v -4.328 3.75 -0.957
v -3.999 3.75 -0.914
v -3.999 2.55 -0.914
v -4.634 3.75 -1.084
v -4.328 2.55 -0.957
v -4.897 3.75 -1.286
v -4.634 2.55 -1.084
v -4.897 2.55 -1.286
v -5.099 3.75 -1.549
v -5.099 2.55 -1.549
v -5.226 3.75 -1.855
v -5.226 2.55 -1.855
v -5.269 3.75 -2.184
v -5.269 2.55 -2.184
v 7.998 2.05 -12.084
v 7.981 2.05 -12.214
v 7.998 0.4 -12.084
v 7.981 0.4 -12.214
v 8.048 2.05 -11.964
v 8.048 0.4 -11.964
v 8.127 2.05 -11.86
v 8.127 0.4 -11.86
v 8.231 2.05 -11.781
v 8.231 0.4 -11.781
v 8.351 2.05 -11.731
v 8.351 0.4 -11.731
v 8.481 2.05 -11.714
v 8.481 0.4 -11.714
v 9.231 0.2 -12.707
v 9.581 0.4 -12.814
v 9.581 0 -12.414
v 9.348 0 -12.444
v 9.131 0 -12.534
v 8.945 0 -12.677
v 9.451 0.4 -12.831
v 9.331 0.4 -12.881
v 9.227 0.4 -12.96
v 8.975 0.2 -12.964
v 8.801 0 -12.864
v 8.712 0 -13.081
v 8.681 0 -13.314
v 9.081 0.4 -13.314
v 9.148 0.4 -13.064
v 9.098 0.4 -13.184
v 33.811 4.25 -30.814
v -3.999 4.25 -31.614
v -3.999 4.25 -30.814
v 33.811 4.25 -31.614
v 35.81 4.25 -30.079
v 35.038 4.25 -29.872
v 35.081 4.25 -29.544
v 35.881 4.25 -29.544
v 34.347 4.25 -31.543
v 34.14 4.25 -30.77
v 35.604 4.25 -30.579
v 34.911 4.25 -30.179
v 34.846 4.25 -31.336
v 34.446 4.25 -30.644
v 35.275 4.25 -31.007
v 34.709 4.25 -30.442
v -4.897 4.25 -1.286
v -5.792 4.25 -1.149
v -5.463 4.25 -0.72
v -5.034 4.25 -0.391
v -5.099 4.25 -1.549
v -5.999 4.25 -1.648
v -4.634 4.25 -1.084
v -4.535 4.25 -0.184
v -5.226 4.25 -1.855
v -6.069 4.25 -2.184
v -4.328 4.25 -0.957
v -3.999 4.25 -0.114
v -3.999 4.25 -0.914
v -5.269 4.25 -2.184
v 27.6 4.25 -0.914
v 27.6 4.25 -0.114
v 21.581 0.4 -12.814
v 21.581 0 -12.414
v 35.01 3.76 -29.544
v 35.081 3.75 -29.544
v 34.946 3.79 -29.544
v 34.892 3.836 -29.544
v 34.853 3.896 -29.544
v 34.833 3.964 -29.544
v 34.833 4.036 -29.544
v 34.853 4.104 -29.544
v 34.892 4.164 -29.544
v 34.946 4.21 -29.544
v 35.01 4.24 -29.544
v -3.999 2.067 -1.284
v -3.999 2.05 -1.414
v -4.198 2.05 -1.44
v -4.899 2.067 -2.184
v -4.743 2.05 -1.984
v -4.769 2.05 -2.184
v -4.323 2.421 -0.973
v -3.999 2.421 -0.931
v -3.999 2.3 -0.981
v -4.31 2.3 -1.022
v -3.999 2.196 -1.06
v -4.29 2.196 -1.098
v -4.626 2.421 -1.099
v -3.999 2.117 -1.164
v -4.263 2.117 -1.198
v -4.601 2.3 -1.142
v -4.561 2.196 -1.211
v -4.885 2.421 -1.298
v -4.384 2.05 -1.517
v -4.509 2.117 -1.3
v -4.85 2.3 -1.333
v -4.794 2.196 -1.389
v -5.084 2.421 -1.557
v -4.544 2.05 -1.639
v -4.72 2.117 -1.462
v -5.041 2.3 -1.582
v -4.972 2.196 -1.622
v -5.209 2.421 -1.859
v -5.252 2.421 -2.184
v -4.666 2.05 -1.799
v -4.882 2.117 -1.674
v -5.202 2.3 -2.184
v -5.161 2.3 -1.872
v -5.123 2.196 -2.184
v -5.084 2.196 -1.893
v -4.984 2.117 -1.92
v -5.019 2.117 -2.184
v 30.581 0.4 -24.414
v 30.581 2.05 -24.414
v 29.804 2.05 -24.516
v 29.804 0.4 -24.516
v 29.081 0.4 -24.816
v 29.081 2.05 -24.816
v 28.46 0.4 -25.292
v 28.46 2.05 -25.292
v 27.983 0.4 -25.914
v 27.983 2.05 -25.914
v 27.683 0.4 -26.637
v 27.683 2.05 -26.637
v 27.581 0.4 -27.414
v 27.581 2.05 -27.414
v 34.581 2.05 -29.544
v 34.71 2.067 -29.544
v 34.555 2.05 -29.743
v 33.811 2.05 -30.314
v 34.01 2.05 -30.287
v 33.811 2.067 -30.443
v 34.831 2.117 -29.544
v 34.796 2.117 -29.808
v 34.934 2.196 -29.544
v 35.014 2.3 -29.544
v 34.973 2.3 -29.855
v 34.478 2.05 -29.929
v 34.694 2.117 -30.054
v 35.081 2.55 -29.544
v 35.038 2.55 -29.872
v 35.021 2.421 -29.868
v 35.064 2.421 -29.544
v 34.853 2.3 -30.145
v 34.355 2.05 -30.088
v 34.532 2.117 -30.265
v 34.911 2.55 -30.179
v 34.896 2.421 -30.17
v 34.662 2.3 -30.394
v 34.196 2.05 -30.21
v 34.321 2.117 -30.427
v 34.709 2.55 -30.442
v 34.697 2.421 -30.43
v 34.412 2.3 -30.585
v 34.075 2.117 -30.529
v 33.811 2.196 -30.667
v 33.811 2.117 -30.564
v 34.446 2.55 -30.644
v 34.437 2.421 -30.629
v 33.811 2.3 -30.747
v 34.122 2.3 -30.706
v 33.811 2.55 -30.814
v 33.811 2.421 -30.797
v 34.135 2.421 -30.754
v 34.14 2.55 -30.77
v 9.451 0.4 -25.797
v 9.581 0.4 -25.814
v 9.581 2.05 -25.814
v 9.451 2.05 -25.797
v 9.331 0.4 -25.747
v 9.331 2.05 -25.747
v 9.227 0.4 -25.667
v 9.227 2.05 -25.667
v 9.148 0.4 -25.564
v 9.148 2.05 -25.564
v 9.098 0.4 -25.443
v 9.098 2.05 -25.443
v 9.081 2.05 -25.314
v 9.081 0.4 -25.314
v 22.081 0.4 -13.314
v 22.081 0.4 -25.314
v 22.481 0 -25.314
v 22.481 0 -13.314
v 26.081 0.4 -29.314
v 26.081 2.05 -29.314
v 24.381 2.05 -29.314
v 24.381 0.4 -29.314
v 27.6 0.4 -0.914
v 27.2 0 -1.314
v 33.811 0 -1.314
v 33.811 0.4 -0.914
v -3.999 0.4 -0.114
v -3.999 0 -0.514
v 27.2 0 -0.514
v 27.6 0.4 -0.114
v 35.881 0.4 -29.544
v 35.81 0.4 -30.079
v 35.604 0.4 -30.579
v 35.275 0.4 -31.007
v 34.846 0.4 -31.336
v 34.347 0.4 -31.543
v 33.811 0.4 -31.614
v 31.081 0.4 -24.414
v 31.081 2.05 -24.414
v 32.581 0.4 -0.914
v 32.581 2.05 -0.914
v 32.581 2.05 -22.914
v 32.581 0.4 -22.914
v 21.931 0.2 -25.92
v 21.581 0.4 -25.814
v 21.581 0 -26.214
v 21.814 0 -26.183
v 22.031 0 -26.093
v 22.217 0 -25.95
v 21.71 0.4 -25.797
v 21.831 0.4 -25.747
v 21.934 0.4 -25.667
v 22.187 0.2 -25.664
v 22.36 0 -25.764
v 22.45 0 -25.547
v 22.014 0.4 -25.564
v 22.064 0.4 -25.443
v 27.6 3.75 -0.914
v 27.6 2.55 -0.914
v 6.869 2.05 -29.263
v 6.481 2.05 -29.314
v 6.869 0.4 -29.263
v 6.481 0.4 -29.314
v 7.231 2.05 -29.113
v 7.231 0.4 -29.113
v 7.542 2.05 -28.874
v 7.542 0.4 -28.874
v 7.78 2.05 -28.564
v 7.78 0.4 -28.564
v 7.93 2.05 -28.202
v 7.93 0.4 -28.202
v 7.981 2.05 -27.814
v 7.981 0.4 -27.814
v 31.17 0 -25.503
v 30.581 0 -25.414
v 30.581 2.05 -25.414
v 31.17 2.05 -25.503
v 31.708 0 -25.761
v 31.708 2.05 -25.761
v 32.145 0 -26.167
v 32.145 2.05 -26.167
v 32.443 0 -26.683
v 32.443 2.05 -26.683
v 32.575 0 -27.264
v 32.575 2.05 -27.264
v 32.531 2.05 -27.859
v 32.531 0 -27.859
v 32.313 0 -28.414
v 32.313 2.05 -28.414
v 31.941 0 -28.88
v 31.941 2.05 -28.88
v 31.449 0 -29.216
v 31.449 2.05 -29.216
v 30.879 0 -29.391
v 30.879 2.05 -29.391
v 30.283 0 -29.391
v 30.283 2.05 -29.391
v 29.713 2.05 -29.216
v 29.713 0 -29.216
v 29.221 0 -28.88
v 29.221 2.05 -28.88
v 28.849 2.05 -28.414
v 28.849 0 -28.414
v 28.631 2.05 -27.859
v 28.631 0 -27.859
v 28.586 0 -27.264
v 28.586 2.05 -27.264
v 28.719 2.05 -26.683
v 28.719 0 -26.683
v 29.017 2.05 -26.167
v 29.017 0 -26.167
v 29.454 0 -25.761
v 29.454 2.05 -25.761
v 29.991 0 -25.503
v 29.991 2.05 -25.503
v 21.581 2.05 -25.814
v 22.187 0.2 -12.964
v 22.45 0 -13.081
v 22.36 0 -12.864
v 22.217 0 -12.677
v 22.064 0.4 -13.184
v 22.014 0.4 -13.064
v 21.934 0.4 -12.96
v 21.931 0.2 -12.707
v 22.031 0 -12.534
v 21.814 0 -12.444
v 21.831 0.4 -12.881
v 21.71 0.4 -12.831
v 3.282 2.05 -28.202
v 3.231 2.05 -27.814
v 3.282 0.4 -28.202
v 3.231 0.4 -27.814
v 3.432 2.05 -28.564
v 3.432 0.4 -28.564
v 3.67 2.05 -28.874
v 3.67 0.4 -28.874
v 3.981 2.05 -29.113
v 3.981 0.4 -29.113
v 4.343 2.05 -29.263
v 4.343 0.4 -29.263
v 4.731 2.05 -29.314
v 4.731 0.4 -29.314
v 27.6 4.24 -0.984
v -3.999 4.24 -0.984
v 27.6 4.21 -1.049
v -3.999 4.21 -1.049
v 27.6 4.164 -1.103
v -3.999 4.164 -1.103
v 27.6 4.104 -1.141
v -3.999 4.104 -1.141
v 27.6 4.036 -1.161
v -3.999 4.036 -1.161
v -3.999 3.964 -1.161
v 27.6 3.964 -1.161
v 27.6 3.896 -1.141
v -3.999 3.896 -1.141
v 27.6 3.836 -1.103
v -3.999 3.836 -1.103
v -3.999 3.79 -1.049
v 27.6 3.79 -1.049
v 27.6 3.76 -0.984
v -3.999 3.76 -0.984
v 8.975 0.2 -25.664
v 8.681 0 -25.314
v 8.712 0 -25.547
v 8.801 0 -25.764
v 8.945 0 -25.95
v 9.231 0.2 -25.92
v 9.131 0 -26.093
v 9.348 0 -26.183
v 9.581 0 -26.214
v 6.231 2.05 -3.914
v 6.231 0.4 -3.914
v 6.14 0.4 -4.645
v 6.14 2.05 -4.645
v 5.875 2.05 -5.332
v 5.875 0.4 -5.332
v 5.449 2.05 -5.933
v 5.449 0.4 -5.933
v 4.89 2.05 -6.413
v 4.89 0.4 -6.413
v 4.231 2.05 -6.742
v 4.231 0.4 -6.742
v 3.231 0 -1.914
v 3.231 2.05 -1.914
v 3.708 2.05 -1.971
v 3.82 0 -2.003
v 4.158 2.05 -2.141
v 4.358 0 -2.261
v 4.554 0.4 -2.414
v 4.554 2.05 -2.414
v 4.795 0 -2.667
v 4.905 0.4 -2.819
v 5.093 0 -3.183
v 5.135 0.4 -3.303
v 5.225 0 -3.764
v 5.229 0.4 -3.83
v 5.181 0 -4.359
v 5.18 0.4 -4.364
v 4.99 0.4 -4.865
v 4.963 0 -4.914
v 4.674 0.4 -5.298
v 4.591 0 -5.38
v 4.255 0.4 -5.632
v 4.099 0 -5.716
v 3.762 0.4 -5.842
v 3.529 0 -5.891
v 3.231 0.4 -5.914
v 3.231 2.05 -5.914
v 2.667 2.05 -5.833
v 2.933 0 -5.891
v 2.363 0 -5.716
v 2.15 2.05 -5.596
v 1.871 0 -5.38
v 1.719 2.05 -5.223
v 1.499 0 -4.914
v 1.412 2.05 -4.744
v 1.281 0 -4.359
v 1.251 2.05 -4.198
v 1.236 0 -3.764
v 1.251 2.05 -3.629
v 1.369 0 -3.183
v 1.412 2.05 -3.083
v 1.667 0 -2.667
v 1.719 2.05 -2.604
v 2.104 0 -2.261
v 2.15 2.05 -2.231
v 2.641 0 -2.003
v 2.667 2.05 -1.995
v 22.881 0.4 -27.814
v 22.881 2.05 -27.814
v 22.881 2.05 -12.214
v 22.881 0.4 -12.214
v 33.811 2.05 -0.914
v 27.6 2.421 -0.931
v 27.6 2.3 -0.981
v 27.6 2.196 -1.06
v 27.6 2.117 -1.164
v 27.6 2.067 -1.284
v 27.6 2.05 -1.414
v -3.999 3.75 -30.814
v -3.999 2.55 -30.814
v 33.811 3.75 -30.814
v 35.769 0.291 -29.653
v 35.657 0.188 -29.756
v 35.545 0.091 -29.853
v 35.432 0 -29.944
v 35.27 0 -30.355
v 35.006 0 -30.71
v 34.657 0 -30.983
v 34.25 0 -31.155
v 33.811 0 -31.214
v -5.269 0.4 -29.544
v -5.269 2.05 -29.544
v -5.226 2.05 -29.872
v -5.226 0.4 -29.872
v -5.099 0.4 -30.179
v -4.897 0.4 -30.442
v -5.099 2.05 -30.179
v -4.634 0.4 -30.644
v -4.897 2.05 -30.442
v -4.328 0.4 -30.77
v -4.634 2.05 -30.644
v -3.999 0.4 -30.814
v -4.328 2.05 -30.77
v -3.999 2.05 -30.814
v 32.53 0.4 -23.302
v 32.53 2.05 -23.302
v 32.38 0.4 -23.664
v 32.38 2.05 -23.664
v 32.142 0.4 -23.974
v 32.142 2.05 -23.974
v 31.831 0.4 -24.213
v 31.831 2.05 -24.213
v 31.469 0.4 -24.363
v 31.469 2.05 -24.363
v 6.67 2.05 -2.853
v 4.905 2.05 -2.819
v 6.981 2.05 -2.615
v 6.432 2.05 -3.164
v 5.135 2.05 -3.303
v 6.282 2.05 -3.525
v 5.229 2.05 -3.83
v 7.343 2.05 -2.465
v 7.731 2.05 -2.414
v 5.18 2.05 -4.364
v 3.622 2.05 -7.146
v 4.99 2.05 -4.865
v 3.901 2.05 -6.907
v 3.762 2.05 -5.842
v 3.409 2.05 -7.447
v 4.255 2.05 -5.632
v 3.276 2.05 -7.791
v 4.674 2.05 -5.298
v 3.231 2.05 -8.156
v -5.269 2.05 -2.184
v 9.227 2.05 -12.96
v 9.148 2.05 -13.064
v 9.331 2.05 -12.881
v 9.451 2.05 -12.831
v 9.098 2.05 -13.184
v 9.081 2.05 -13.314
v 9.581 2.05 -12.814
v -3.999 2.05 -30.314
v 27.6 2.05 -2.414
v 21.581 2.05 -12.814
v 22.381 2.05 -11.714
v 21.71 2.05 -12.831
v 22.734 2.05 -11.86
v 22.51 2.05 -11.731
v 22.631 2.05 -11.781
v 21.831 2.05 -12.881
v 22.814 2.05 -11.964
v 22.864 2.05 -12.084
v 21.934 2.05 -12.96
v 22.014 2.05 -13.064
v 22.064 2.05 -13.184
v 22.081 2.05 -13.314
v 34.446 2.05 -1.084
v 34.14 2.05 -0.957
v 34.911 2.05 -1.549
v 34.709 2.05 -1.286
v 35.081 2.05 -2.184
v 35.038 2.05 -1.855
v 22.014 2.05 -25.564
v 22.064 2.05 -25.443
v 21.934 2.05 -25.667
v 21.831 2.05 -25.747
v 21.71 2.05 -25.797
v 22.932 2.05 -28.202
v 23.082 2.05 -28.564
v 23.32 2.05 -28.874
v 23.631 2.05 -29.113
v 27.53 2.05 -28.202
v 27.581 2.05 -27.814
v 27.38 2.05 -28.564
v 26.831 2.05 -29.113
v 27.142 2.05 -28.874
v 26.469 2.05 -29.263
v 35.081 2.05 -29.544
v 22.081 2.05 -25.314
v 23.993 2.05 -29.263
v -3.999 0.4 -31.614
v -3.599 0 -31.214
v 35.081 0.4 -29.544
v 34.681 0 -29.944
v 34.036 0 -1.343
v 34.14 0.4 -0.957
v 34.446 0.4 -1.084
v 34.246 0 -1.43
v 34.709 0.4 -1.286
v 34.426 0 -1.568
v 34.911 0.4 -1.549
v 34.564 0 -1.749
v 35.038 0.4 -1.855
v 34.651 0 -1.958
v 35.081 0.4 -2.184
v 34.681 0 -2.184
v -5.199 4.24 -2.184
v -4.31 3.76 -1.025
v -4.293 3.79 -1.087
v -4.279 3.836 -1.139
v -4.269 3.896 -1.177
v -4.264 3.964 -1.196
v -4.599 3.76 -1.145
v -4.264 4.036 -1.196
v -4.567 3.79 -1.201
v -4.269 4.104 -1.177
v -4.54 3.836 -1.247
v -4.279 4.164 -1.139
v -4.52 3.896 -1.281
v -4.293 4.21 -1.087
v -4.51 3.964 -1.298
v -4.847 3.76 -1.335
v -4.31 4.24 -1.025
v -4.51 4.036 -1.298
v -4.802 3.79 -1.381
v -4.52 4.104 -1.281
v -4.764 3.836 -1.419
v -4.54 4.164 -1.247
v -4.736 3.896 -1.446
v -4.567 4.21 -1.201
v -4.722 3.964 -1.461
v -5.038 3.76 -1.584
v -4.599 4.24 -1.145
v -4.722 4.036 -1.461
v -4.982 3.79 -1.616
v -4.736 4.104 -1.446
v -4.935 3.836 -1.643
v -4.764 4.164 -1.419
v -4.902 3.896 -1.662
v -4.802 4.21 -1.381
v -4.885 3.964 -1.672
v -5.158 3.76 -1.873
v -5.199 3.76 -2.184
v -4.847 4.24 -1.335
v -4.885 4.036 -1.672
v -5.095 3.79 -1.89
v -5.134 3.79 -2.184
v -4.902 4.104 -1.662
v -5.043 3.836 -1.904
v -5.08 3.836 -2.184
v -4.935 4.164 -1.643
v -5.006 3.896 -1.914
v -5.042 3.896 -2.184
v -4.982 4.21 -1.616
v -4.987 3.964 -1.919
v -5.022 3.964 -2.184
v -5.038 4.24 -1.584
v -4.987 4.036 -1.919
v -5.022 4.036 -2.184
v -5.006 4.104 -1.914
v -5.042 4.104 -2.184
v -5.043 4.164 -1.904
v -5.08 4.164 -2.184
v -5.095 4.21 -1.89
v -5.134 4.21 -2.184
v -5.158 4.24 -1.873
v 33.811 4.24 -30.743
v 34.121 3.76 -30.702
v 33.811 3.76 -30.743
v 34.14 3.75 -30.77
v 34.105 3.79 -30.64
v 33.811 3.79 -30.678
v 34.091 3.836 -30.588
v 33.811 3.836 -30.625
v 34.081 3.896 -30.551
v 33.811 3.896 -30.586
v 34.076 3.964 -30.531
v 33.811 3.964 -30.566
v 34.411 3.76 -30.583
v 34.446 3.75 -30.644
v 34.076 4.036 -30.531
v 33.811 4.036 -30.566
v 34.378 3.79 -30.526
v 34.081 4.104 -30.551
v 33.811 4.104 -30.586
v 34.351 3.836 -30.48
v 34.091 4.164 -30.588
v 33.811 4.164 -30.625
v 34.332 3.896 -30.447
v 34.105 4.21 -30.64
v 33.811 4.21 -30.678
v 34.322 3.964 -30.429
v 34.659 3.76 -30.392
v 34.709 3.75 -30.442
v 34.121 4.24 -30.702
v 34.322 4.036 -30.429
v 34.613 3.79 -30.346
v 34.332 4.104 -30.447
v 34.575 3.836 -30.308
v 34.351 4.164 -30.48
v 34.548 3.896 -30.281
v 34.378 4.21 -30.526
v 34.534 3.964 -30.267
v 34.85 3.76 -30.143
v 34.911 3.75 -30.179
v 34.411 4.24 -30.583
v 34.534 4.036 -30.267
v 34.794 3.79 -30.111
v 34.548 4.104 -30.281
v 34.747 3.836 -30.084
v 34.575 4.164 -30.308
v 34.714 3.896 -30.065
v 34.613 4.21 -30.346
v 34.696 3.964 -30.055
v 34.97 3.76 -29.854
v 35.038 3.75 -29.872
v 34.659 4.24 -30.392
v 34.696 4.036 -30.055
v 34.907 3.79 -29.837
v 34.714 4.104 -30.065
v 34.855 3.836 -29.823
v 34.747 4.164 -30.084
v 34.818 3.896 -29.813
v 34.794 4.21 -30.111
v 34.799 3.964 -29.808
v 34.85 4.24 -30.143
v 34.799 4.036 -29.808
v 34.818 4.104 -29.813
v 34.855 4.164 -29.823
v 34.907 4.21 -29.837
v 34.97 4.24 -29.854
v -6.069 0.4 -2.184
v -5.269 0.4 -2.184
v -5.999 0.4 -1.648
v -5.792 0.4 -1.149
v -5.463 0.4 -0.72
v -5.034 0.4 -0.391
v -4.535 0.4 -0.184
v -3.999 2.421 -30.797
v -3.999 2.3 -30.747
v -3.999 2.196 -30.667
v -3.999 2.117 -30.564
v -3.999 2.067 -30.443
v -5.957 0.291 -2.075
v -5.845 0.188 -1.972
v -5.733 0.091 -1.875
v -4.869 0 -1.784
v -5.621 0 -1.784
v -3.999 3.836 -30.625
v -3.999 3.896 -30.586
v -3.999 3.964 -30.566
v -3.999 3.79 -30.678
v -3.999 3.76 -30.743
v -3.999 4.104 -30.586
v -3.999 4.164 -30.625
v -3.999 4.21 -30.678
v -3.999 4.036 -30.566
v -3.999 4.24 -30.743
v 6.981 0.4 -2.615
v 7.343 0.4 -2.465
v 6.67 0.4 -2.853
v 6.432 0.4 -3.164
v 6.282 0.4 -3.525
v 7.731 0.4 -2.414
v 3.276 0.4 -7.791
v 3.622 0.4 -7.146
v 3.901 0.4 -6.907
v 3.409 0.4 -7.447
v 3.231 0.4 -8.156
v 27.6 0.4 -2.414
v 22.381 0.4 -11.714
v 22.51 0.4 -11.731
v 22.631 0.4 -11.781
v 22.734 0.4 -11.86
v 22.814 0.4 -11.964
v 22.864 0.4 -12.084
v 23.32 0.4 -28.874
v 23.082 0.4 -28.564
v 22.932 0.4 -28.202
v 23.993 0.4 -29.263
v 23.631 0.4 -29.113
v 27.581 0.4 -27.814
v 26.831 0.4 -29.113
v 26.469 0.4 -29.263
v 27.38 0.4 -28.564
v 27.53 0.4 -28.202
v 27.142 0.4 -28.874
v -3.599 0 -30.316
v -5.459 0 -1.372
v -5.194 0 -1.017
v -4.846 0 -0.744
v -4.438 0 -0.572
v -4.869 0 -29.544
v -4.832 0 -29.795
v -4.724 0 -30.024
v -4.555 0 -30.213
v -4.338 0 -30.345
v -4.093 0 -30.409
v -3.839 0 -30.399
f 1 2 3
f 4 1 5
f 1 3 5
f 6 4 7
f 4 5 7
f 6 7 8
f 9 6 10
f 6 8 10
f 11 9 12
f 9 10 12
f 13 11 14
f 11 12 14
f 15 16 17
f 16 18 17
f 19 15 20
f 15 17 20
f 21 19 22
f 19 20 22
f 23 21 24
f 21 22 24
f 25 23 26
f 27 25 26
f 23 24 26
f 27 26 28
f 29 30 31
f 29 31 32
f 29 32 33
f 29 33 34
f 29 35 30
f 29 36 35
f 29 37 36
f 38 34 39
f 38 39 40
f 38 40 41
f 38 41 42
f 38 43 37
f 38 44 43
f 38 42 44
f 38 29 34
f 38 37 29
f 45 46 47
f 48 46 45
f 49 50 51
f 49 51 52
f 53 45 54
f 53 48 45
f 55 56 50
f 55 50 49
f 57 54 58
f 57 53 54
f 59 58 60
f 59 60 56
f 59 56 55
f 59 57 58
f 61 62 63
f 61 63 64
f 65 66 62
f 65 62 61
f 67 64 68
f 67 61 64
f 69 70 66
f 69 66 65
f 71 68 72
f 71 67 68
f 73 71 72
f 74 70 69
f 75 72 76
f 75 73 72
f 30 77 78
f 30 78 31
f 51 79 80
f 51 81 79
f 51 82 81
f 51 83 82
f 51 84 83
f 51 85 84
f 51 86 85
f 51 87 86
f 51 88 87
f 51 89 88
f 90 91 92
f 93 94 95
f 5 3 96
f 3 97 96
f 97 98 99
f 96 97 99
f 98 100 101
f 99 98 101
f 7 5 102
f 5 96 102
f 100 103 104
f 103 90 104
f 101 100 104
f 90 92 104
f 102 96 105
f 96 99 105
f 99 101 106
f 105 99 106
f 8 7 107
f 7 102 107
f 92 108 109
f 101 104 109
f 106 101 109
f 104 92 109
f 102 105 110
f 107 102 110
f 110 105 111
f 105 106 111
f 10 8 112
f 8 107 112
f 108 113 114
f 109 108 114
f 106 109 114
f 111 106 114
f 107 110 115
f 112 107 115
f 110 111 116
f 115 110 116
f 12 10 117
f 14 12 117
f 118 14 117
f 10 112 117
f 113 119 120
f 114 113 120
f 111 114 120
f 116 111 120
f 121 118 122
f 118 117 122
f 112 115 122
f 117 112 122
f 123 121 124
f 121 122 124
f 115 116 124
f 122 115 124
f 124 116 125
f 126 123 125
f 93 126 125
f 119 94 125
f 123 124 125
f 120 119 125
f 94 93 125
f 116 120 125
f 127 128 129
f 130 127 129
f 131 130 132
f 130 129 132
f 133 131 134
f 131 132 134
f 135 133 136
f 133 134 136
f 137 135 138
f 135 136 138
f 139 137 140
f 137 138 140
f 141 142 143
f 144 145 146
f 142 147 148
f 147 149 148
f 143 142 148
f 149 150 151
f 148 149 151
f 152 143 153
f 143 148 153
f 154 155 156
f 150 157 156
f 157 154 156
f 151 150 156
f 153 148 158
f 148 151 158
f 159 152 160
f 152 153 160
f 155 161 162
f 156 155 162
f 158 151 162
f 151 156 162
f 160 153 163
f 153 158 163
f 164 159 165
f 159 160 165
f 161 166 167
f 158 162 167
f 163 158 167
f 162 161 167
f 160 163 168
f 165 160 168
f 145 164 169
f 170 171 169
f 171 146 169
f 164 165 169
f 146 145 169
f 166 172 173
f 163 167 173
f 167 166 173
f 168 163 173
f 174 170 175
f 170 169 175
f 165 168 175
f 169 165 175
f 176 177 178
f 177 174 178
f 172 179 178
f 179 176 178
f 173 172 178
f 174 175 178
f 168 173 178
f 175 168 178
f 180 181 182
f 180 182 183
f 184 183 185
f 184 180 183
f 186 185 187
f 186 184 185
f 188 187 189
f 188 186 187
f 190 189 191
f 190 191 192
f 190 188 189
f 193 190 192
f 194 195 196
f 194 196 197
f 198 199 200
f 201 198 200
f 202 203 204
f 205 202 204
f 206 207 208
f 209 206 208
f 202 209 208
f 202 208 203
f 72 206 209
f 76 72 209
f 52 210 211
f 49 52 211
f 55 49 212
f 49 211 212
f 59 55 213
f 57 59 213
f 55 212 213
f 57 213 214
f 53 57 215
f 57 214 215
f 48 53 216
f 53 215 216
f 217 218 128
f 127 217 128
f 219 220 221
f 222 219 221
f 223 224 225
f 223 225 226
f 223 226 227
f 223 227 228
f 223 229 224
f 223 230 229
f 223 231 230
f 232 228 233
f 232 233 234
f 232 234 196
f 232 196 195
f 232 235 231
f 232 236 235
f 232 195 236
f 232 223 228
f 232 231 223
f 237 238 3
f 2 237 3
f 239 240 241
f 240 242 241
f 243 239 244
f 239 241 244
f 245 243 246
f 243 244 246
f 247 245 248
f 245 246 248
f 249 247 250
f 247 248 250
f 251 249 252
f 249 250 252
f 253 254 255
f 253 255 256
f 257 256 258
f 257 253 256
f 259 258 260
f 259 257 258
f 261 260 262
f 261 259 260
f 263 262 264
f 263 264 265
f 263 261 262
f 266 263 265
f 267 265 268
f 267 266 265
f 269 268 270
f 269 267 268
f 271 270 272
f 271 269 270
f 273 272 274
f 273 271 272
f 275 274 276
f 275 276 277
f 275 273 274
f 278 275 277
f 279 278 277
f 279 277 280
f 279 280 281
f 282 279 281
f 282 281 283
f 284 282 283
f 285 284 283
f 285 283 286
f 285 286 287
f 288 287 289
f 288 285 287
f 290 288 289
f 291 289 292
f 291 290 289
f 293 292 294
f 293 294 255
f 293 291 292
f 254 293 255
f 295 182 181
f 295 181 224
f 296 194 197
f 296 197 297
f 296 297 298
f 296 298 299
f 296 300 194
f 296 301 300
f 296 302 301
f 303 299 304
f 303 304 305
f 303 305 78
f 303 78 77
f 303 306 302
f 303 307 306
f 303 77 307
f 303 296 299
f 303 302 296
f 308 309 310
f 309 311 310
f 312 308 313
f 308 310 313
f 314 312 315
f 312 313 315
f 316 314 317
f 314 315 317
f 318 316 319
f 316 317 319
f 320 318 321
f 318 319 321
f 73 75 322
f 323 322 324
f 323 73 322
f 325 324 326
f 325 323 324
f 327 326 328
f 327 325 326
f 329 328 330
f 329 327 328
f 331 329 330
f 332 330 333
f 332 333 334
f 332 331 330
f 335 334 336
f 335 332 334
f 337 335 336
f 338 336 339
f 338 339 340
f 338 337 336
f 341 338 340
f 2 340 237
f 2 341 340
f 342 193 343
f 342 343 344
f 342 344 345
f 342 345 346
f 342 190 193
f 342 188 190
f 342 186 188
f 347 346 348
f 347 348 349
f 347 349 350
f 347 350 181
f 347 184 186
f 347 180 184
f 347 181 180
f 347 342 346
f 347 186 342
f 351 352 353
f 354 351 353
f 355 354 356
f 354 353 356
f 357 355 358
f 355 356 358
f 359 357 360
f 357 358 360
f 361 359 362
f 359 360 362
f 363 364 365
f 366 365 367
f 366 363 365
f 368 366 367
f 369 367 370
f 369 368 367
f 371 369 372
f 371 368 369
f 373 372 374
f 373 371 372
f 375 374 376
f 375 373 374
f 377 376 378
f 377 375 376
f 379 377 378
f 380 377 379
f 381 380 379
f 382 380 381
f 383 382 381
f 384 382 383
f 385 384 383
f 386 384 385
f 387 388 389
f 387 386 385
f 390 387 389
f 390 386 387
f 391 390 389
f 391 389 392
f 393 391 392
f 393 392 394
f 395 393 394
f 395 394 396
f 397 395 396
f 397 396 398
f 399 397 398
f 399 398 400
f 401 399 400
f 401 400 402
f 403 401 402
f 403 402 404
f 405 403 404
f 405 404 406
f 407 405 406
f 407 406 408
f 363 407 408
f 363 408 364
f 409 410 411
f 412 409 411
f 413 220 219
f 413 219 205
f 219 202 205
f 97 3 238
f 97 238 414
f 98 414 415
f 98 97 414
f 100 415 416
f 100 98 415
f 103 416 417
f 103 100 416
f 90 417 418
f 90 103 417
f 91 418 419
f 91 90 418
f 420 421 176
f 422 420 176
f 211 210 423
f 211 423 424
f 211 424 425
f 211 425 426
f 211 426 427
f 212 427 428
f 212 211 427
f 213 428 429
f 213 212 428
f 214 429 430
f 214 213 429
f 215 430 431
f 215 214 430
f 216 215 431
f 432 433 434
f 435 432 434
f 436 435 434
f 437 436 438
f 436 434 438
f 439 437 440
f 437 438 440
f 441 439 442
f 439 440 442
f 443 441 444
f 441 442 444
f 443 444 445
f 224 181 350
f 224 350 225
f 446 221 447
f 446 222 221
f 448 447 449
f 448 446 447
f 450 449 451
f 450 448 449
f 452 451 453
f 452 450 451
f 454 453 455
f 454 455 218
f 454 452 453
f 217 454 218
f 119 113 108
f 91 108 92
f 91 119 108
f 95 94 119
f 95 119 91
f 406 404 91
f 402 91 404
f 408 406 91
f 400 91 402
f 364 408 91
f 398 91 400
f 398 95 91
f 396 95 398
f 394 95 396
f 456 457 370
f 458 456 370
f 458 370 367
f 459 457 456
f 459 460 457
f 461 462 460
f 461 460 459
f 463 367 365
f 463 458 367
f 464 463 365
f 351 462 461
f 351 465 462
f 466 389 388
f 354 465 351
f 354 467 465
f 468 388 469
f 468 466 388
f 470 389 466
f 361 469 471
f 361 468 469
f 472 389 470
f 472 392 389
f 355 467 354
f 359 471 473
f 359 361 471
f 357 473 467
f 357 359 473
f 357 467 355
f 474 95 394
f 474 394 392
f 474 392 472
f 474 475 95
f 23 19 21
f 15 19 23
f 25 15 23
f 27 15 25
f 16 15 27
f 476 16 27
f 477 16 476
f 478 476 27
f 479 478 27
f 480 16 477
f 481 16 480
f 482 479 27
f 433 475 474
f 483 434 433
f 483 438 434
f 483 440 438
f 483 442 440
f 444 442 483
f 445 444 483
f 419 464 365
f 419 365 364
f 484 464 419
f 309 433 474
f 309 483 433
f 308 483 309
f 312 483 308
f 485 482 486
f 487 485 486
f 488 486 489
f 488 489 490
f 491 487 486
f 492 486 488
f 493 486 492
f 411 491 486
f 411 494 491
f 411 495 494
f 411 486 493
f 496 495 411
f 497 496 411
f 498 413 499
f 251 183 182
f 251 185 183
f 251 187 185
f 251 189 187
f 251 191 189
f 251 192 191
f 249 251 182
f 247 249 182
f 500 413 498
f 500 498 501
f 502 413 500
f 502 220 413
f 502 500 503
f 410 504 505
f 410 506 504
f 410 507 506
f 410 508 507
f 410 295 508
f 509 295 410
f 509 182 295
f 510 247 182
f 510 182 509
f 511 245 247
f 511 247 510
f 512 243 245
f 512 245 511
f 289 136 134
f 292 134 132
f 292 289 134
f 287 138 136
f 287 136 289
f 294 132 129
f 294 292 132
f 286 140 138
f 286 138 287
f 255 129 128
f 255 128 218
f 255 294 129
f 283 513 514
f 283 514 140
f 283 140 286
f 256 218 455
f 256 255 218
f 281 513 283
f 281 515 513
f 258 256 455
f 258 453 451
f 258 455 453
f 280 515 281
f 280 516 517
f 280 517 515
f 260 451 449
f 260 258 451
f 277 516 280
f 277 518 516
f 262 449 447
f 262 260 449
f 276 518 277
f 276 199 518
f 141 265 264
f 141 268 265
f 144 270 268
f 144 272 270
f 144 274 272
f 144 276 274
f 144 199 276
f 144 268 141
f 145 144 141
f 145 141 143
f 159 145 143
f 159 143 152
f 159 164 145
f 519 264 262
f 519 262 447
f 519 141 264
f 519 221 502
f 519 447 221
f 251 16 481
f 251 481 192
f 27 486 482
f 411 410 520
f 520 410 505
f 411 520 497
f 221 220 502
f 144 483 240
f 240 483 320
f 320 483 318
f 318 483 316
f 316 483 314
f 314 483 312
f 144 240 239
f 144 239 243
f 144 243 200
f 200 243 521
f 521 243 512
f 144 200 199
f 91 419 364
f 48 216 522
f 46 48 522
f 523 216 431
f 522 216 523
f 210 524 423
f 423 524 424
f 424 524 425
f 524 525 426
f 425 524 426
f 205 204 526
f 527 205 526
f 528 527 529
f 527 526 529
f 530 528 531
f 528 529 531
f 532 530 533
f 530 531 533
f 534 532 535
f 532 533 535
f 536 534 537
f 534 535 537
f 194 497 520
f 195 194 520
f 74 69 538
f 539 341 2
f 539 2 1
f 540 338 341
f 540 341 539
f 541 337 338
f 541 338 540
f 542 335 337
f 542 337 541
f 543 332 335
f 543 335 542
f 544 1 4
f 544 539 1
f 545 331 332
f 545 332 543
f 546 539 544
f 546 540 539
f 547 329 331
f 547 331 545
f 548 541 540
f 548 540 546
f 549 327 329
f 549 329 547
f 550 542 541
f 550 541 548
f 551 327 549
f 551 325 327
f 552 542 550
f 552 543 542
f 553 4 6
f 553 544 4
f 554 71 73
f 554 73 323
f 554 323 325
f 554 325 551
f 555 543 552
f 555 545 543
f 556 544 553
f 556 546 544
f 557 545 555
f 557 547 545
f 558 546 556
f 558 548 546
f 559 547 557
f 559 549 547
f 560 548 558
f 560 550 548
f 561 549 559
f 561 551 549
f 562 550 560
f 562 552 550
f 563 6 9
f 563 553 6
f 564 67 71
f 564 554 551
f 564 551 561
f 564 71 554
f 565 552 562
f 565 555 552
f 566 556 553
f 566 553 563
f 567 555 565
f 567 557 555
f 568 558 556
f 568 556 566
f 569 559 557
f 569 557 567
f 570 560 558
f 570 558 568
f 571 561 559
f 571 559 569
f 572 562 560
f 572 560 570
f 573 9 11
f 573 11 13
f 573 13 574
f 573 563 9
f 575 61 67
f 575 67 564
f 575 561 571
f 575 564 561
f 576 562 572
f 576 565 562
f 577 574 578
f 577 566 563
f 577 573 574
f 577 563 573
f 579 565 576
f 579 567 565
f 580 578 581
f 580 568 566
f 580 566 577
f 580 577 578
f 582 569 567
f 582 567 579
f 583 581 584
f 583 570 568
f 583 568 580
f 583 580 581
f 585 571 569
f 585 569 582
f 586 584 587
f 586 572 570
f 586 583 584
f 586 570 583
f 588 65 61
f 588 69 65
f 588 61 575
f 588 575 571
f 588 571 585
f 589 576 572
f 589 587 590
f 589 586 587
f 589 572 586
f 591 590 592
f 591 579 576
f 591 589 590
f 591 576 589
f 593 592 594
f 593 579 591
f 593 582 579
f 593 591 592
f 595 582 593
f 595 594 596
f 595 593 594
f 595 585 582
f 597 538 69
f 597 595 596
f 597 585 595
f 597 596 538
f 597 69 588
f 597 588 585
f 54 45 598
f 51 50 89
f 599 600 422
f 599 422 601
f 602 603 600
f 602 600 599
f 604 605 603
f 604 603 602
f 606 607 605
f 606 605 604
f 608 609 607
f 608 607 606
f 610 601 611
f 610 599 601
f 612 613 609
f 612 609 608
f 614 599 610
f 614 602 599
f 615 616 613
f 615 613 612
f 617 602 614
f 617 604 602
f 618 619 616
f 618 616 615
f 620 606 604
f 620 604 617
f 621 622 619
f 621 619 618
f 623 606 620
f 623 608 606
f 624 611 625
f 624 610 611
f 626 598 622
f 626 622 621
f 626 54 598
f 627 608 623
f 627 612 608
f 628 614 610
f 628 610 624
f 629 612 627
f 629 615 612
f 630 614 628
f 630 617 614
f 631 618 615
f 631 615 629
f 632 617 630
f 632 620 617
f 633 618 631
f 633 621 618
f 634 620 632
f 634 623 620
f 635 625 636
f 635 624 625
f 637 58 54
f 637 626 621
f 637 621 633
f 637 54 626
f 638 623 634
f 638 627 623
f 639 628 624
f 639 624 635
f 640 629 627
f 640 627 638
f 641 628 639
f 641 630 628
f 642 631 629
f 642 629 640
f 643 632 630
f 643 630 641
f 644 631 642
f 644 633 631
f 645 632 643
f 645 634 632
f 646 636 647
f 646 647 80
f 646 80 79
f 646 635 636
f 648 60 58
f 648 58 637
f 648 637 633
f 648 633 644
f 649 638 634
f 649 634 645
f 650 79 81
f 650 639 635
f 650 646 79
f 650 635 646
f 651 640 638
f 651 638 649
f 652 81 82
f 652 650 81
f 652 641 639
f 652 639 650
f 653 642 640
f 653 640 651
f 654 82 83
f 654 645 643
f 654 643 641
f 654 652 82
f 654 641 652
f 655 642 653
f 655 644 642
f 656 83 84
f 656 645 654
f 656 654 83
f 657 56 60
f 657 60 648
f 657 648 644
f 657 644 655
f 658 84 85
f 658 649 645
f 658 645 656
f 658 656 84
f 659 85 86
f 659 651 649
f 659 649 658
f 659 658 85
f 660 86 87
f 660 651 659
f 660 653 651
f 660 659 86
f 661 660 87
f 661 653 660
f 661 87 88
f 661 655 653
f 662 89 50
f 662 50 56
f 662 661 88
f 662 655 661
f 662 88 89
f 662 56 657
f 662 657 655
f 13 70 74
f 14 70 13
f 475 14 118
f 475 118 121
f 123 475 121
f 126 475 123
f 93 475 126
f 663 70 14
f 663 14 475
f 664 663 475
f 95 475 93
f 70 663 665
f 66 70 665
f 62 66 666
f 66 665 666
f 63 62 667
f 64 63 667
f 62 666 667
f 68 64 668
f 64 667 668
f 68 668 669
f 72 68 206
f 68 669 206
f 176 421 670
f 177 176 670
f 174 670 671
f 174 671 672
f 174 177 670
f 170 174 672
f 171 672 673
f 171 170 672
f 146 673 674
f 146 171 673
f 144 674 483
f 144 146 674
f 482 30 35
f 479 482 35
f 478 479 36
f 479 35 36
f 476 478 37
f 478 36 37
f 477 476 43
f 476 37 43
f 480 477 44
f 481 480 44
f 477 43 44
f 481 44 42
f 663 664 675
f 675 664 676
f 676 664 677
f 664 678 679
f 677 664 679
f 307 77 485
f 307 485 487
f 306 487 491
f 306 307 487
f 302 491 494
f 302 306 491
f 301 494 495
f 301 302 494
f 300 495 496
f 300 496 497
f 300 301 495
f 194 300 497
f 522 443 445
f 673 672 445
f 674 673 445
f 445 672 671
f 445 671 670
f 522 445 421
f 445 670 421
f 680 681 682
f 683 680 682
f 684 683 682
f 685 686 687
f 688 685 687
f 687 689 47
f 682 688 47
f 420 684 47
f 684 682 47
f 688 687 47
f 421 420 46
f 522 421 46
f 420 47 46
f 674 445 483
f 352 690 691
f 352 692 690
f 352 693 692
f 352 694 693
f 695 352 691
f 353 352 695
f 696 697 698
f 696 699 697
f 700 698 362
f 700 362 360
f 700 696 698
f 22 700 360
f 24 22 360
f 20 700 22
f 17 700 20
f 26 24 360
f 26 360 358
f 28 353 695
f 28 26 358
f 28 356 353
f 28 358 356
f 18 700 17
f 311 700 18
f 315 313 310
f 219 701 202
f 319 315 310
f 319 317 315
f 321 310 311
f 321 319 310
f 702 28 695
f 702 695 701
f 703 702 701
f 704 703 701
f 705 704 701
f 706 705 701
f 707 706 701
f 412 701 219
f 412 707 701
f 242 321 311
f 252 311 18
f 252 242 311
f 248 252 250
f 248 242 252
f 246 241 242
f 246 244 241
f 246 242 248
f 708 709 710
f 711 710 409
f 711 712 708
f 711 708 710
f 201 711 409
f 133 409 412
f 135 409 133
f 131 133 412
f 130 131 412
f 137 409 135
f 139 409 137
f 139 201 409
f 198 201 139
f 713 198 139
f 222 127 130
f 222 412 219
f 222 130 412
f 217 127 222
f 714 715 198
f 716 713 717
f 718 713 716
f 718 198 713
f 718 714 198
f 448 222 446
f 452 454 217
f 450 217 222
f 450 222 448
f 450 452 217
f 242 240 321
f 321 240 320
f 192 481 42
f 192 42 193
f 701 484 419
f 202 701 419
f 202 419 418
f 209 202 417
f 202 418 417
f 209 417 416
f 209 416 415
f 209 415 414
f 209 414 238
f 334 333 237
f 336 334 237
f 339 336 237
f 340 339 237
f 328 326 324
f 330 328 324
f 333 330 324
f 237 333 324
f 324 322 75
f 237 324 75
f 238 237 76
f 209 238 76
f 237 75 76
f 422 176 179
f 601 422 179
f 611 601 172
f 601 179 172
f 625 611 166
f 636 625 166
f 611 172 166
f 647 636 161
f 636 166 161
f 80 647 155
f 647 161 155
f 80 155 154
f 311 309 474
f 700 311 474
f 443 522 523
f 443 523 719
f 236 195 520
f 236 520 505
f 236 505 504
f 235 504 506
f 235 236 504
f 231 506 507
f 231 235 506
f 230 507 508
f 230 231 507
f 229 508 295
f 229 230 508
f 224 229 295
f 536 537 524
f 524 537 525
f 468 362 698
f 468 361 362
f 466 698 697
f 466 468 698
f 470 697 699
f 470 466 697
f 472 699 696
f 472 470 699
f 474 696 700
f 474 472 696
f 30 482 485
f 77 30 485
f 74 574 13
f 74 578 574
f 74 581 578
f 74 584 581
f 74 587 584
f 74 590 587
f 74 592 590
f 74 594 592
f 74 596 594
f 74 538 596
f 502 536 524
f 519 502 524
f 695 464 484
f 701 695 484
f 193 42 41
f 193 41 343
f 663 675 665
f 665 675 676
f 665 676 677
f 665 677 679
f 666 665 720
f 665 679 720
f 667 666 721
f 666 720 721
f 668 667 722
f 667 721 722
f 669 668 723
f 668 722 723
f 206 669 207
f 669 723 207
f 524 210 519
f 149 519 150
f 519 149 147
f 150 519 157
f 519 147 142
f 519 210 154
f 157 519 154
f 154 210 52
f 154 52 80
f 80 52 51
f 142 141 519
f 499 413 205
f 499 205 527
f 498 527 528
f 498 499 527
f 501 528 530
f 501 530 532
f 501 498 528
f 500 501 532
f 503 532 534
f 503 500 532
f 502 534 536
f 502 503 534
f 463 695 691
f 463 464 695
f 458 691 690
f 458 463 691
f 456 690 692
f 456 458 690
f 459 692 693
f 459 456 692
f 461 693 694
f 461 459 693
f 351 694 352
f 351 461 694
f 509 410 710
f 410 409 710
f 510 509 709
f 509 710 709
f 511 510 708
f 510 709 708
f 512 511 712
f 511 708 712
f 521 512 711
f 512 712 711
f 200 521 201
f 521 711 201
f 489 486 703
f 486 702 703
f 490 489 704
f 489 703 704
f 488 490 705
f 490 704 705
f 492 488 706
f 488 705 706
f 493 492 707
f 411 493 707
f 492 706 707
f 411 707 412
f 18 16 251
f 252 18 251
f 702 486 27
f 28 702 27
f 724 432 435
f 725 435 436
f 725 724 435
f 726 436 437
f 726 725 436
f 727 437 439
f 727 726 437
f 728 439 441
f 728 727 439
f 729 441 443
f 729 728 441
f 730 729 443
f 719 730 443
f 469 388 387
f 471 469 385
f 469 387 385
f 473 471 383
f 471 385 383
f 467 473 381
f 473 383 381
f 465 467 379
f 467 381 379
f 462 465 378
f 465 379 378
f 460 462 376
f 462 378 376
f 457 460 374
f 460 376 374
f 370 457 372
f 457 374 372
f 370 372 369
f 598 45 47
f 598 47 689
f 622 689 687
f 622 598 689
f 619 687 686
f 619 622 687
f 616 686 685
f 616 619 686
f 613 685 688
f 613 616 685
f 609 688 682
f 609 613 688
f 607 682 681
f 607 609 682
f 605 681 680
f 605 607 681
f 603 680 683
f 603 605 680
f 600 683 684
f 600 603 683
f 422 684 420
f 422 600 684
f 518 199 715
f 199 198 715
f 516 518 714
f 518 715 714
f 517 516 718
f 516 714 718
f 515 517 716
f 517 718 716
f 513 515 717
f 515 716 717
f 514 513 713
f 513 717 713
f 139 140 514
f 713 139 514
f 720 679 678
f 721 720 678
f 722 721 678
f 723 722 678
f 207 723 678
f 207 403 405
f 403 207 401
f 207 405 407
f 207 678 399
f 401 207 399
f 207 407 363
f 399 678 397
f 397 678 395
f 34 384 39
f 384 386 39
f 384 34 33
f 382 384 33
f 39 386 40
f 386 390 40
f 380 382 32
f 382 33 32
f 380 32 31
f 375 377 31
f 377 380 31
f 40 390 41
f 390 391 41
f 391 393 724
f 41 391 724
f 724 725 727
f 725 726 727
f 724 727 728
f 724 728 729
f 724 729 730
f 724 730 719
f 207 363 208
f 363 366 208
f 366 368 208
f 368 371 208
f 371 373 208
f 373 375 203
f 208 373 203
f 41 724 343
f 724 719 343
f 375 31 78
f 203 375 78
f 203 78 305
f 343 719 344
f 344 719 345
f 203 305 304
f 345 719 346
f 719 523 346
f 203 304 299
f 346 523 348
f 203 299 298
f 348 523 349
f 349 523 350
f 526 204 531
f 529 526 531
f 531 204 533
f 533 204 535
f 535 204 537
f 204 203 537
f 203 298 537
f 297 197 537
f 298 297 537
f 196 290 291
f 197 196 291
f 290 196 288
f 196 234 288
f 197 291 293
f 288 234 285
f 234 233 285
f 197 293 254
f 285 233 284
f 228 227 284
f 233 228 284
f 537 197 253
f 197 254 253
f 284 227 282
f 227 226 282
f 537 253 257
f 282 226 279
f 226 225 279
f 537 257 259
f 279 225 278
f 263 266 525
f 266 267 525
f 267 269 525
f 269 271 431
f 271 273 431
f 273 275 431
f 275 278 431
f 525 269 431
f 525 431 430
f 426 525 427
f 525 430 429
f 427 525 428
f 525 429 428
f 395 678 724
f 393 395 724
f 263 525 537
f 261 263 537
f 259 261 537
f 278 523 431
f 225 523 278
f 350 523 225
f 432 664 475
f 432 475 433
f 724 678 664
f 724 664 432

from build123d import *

# Parameters (mm, degrees)
CROQUIS1_W              = 40.35
CROQUIS1_H              = 29.9
CROQUIS1_R              = 2
SALIENTE_EXTRUIR1_DEPTH = 2.05
CORTAR_EXTRUIR2_DEPTH   = 1.65
CROQUIS3_W              = 13
CROQUIS3_H              = 13
CORTAR_EXTRUIR3_DEPTH   = 47.737063506
REDONDEO2_R             = 0.5
CHAFL_N1_SIZE           = 0.4
REDONDEO4_R             = 1.27
SALIENTE_EXTRUIR3_START = -2.05
SALIENTE_EXTRUIR3_DEPTH = 4.25
SALIENTE_EXTRUIR4_DEPTH = 1.65
CROQUIS9_R              = 0.25
CROQUIS11_R             = 0.25
REDONDEO6_R             = 1.5
REDONDEO7_R             = 0.5
REDONDEO8_R             = 0.5
CHAFL_N2_SIZE           = 0.4


# Some blends are built 0.0001 mm under size
with BuildPart() as part:
    # Croquis1 → Saliente-Extruir1 (new body)
    with BuildSketch(Plane(origin=(0, 0, 0), x_dir=(1, 0, 0), z_dir=(0, 1, 0))):
        with Locations((14.905897563, 15.863653327)):
            Rectangle(CROQUIS1_W, CROQUIS1_H)
        with Locations(Location((3.230897563, 3.913653327, 0), (0, 0, 270))):
            Circle(CROQUIS1_R, mode=Mode.SUBTRACT)
        with Locations(Location((30.580897563, 27.413653327, 0), (0, 0, 270))):
            Circle(CROQUIS1_R, mode=Mode.SUBTRACT)
    extrude(amount=SALIENTE_EXTRUIR1_DEPTH)

    # Croquis2 → Cortar-Extruir2 (cut)
    with BuildSketch(Plane(origin=(0, 2.05, 0), x_dir=(1, 0, 0), z_dir=(0, 1, 0))):
        with BuildLine():
            Line((27.580897563, 27.413653327), (27.580897563, 29.313653327))
            Line((27.580897563, 29.313653327), (22.880897563, 29.313653327))
            Line((22.880897563, 29.313653327), (22.880897563, 26.613653327))
            Line((22.880897563, 26.613653327), (22.880897563, 11.713653327))
            Line((22.880897563, 11.713653327), (7.980897563, 11.713653327))
            Line((7.980897563, 11.713653327), (7.980897563, 26.613653327))
            Line((7.980897563, 26.613653327), (7.980897563, 29.313653327))
            Line((7.980897563, 29.313653327), (3.230897563, 29.313653327))
            Line((3.230897563, 29.313653327), (3.230897563, 2.413653327))
            Line((3.230897563, 2.413653327), (27.6, 2.413653327))
            Line((27.6, 2.413653327), (27.6, 0.913653327))
            Line((27.6, 0.913653327), (32.580897563, 0.913653327))
            Line((32.580897563, 0.913653327), (32.580897563, 24.413653327))
            Line((32.580897563, 24.413653327), (30.580897563, 24.413653327))
            ThreePointArc((30.580897563, 24.413653327), (28.459577219, 25.292332983), (27.580897563, 27.413653327))
        make_face()
    extrude(amount=-CORTAR_EXTRUIR2_DEPTH, mode=Mode.SUBTRACT)

    # Croquis3 → Cortar-Extruir3 (cut, through all)
    with BuildSketch(Plane(origin=(0, 2.05, 0), x_dir=(1, 0, 0), z_dir=(0, 1, 0))):
        with Locations((15.580897563, 19.313653327)):
            Rectangle(CROQUIS3_W, CROQUIS3_H)
    extrude(amount=-CORTAR_EXTRUIR3_DEPTH, mode=Mode.SUBTRACT)

    # Redondeo2
    redondeo2_edges = [part.edges().sort_by_distance(p)[0] for p in [
        (9.080897563, 1.025, -12.813653327),
        (9.080897563, 1.025, -25.813653327),
        (22.080897563, 1.025, -25.813653327),
        (22.080897563, 1.025, -12.813653327),
    ]]
    fillet(redondeo2_edges, radius=REDONDEO2_R)

    # Chaflán1
    chafl_n1_edges = [part.edges().sort_by_distance(p)[0] for p in [
        (15.580897563, 0, -25.813653327),
        (22.080897563, 0, -19.313653327),
        (15.580897563, 0, -12.813653327),
        (9.080897563, 0, -19.313653327),
        (21.934450953, 0, -25.667206717),
        (21.934450953, 0, -12.960099936),
        (9.227344172, 0, -12.960099936),
        (9.227344172, 0, -25.667206717),
    ]]
    chamfer(chafl_n1_edges, length=CHAFL_N1_SIZE)

    # Redondeo4
    redondeo4_edges = [part.edges().sort_by_distance(p)[0] for p in [
        (-5.269102437, 1.025, -30.813653327),
        (35.080897563, 1.025, -30.813653327),
        (35.080897563, 1.025, -0.913653327),
        (-5.269102437, 1.025, -0.913653327),
    ]]
    fillet(redondeo4_edges, radius=REDONDEO4_R)

    # Croquis6 → Saliente-Extruir3 (add)
    with BuildSketch(Plane(origin=(0, 2.05, 0), x_dir=(1, 0, 0), z_dir=(0, 1, 0)).offset(SALIENTE_EXTRUIR3_START)):
        with BuildLine():
            Line((-3.999102437, 30.813653327), (33.810897563, 30.813653327))
            ThreePointArc((33.810897563, 30.813653327), (34.708923175, 30.441678939), (35.080897563, 29.543653327))
            Line((35.080897563, 29.543653327), (35.880897563, 29.543653327))
            ThreePointArc((35.880897563, 29.543653327), (35.2746086, 31.007364364), (33.810897563, 31.613653327))
            Line((33.810897563, 31.613653327), (-3.999102437, 31.613653327))
            Line((-3.999102437, 31.613653327), (-3.999102437, 30.813653327))
        make_face()
        with BuildLine():
            Line((27.6, 0.913653327), (-3.999102437, 0.913653327))
            ThreePointArc((-3.999102437, 0.913653327), (-4.89712805, 1.285627715), (-5.269102437, 2.183653327))
            Line((-5.269102437, 2.183653327), (-6.069102437, 2.183653327))
            ThreePointArc((-6.069102437, 2.183653327), (-5.462813475, 0.71994229), (-3.999102437, 0.113653327))
            Line((-3.999102437, 0.113653327), (27.6, 0.113653327))
            Line((27.6, 0.113653327), (27.6, 0.913653327))
        make_face()
    extrude(amount=SALIENTE_EXTRUIR3_DEPTH)

    # Croquis7 → Saliente-Extruir4 (add)
    with BuildSketch(Plane(origin=(0, 0.4, 0), x_dir=(1, 0, 0), z_dir=(0, 1, 0))):
        with BuildLine():
            ThreePointArc((6.230897563, 3.913653327), (5.352217906, 6.03497367), (3.230897563, 6.913653327))
            Line((3.230897563, 6.913653327), (3.230897563, 5.913653327))
            ThreePointArc((3.230897563, 5.913653327), (5.101726256, 4.620760108), (4.553773218, 2.413653327))
            Line((4.553773218, 2.413653327), (6.230897563, 2.413653327))
            Line((6.230897563, 2.413653327), (6.230897563, 3.913653327))
        make_face()
    extrude(amount=SALIENTE_EXTRUIR4_DEPTH)

    # Barrer1: sweep along a path in Croquis10
    with BuildLine(Plane(origin=(0, 4.25, 0), x_dir=(1, 0, 0), z_dir=(0, 1, 0))) as barrer1_path:
        Line((-3.999102437, 30.813653327), (33.810897563, 30.813653327))
        ThreePointArc((33.810897563, 30.813653327), (34.708923175, 30.441678939), (35.080897563, 29.543653327))
    # Croquis9 → Barrer1 (sweep)
    with BuildSketch(Plane.XY.offset(-29.543653327)):
        with Locations((35.080897563, 4)):
            Circle(CROQUIS9_R)
    sweep(path=barrer1_path.line)

    # Barrer2: sweep along a path in Croquis12
    with BuildLine(Plane(origin=(0, 4.25, 0), x_dir=(1, 0, 0), z_dir=(0, 1, 0))) as barrer2_path:
        Line((27.6, 0.913653327), (-3.999102437, 0.913653327))
        ThreePointArc((-3.999102437, 0.913653327), (-4.89712805, 1.285627715), (-5.269102437, 2.183653327))
    # Croquis11 → Barrer2 (sweep)
    with BuildSketch(Plane(origin=(0, 0, -2.183653327), x_dir=(-1, 0, 0), z_dir=(0, 0, -1))):
        with Locations((5.269102437, 4)):
            Circle(CROQUIS11_R)
    sweep(path=barrer2_path.line)

    # Redondeo6
    redondeo6_edges = [part.edges().sort_by_distance(p)[0] for p in [
        (3.230897563, 1.225, -6.913653327),
        (6.230897563, 1.225, -2.413653327),
        (3.230897563, 1.225, -29.313653327),
        (7.980897563, 1.225, -29.313653327),
        (22.880897563, 1.225, -29.313653327),
        (27.580897563, 1.225, -29.313653327),
        (32.580897563, 1.225, -24.413653327),
    ]]
    fillet(redondeo6_edges, radius=REDONDEO6_R - 0.0001)  # a hair under: the kernel refuses the full size

    # Redondeo7
    redondeo7_edges = [part.edges().sort_by_distance(p)[0] for p in [
        (7.980897563, 1.225, -11.713653327),
        (22.880897563, 1.225, -11.713653327),
    ]]
    fillet(redondeo7_edges, radius=REDONDEO7_R)

    # Redondeo8
    # the kernel refuses this fillet: 0.5 mm, written as the material it adds along each edge
    with BuildSketch(Plane(origin=(33.810897563, 2.05, -30.813653327), x_dir=(0, 0, 1), z_dir=(-1, 0, 0))) as redondeo8_piece_1:
        with BuildLine():
            CenterArc((REDONDEO8_R, REDONDEO8_R), REDONDEO8_R, 180, 90)
            Line((0, REDONDEO8_R), (0, 0))
            Line((0, 0), (REDONDEO8_R, 0))
        make_face()
    extrude(amount=37.81)
    with BuildSketch(Plane(origin=(-3.999102437, 2.05, -0.913653327), x_dir=(0, 0, -1), z_dir=(1, 0, 0))) as redondeo8_piece_2:
        with BuildLine():
            CenterArc((REDONDEO8_R, REDONDEO8_R), REDONDEO8_R, 180, 90)
            Line((0, REDONDEO8_R), (0, 0))
            Line((0, 0), (REDONDEO8_R, 0))
        make_face()
    extrude(amount=31.599102437)
    with BuildSketch(Plane(origin=(33.810897563, 2.05, -29.543653327), x_dir=(1, 0, 0), z_dir=(0, 0, 1))) as redondeo8_piece_3:
        with BuildLine():
            CenterArc((1.27 - REDONDEO8_R, REDONDEO8_R), REDONDEO8_R, 270, 90)
            Line((1.27, REDONDEO8_R), (1.27, 0))
            Line((1.27, 0), (1.27 - REDONDEO8_R, 0))
        make_face()
    revolve(axis=Axis((33.810897563, 2.05, -29.543653327), (0, 1, 0)), revolution_arc=90)
    with BuildSketch(Plane(origin=(-3.999102437, 2.05, -2.183653327), x_dir=(0, 0, 1), z_dir=(1, 0, 0))) as redondeo8_piece_4:
        with BuildLine():
            CenterArc((1.27 - REDONDEO8_R, -REDONDEO8_R), REDONDEO8_R, 0, 90)
            Line((1.27, -REDONDEO8_R), (1.27, 0))
            Line((1.27, 0), (1.27 - REDONDEO8_R, 0))
        make_face()
    revolve(axis=Axis((-3.999102437, 2.05, -2.183653327), (0, -1, 0)), revolution_arc=90)

    # Chaflán2
    chafl_n2_edges = [part.edges().sort_by_distance(p)[0] for p in [
        (-5.269102437, 0, -15.863653327),
        (-5.669102437, 0, -2.183653327),
        (-5.462813475, 0, -0.71994229),
        (11.800448781, 0, -0.113653327),
        (27.6, 0, -0.513653327),
        (30.705448781, 0, -0.913653327),
        (34.708923175, 0, -1.285627715),
        (35.080897563, 0, -15.863653327),
        (35.480897563, 0, -29.543653327),
        (35.2746086, 0, -31.007364364),
        (14.905897563, 0, -31.613653327),
        (-3.999102437, 0, -31.213653327),
        (-4.89712805, 0, -30.441678939),
    ]]
    chamfer(chafl_n2_edges, length=CHAFL_N2_SIZE - 0.0001)  # a hair under: the kernel refuses the full size


solid = part.part
